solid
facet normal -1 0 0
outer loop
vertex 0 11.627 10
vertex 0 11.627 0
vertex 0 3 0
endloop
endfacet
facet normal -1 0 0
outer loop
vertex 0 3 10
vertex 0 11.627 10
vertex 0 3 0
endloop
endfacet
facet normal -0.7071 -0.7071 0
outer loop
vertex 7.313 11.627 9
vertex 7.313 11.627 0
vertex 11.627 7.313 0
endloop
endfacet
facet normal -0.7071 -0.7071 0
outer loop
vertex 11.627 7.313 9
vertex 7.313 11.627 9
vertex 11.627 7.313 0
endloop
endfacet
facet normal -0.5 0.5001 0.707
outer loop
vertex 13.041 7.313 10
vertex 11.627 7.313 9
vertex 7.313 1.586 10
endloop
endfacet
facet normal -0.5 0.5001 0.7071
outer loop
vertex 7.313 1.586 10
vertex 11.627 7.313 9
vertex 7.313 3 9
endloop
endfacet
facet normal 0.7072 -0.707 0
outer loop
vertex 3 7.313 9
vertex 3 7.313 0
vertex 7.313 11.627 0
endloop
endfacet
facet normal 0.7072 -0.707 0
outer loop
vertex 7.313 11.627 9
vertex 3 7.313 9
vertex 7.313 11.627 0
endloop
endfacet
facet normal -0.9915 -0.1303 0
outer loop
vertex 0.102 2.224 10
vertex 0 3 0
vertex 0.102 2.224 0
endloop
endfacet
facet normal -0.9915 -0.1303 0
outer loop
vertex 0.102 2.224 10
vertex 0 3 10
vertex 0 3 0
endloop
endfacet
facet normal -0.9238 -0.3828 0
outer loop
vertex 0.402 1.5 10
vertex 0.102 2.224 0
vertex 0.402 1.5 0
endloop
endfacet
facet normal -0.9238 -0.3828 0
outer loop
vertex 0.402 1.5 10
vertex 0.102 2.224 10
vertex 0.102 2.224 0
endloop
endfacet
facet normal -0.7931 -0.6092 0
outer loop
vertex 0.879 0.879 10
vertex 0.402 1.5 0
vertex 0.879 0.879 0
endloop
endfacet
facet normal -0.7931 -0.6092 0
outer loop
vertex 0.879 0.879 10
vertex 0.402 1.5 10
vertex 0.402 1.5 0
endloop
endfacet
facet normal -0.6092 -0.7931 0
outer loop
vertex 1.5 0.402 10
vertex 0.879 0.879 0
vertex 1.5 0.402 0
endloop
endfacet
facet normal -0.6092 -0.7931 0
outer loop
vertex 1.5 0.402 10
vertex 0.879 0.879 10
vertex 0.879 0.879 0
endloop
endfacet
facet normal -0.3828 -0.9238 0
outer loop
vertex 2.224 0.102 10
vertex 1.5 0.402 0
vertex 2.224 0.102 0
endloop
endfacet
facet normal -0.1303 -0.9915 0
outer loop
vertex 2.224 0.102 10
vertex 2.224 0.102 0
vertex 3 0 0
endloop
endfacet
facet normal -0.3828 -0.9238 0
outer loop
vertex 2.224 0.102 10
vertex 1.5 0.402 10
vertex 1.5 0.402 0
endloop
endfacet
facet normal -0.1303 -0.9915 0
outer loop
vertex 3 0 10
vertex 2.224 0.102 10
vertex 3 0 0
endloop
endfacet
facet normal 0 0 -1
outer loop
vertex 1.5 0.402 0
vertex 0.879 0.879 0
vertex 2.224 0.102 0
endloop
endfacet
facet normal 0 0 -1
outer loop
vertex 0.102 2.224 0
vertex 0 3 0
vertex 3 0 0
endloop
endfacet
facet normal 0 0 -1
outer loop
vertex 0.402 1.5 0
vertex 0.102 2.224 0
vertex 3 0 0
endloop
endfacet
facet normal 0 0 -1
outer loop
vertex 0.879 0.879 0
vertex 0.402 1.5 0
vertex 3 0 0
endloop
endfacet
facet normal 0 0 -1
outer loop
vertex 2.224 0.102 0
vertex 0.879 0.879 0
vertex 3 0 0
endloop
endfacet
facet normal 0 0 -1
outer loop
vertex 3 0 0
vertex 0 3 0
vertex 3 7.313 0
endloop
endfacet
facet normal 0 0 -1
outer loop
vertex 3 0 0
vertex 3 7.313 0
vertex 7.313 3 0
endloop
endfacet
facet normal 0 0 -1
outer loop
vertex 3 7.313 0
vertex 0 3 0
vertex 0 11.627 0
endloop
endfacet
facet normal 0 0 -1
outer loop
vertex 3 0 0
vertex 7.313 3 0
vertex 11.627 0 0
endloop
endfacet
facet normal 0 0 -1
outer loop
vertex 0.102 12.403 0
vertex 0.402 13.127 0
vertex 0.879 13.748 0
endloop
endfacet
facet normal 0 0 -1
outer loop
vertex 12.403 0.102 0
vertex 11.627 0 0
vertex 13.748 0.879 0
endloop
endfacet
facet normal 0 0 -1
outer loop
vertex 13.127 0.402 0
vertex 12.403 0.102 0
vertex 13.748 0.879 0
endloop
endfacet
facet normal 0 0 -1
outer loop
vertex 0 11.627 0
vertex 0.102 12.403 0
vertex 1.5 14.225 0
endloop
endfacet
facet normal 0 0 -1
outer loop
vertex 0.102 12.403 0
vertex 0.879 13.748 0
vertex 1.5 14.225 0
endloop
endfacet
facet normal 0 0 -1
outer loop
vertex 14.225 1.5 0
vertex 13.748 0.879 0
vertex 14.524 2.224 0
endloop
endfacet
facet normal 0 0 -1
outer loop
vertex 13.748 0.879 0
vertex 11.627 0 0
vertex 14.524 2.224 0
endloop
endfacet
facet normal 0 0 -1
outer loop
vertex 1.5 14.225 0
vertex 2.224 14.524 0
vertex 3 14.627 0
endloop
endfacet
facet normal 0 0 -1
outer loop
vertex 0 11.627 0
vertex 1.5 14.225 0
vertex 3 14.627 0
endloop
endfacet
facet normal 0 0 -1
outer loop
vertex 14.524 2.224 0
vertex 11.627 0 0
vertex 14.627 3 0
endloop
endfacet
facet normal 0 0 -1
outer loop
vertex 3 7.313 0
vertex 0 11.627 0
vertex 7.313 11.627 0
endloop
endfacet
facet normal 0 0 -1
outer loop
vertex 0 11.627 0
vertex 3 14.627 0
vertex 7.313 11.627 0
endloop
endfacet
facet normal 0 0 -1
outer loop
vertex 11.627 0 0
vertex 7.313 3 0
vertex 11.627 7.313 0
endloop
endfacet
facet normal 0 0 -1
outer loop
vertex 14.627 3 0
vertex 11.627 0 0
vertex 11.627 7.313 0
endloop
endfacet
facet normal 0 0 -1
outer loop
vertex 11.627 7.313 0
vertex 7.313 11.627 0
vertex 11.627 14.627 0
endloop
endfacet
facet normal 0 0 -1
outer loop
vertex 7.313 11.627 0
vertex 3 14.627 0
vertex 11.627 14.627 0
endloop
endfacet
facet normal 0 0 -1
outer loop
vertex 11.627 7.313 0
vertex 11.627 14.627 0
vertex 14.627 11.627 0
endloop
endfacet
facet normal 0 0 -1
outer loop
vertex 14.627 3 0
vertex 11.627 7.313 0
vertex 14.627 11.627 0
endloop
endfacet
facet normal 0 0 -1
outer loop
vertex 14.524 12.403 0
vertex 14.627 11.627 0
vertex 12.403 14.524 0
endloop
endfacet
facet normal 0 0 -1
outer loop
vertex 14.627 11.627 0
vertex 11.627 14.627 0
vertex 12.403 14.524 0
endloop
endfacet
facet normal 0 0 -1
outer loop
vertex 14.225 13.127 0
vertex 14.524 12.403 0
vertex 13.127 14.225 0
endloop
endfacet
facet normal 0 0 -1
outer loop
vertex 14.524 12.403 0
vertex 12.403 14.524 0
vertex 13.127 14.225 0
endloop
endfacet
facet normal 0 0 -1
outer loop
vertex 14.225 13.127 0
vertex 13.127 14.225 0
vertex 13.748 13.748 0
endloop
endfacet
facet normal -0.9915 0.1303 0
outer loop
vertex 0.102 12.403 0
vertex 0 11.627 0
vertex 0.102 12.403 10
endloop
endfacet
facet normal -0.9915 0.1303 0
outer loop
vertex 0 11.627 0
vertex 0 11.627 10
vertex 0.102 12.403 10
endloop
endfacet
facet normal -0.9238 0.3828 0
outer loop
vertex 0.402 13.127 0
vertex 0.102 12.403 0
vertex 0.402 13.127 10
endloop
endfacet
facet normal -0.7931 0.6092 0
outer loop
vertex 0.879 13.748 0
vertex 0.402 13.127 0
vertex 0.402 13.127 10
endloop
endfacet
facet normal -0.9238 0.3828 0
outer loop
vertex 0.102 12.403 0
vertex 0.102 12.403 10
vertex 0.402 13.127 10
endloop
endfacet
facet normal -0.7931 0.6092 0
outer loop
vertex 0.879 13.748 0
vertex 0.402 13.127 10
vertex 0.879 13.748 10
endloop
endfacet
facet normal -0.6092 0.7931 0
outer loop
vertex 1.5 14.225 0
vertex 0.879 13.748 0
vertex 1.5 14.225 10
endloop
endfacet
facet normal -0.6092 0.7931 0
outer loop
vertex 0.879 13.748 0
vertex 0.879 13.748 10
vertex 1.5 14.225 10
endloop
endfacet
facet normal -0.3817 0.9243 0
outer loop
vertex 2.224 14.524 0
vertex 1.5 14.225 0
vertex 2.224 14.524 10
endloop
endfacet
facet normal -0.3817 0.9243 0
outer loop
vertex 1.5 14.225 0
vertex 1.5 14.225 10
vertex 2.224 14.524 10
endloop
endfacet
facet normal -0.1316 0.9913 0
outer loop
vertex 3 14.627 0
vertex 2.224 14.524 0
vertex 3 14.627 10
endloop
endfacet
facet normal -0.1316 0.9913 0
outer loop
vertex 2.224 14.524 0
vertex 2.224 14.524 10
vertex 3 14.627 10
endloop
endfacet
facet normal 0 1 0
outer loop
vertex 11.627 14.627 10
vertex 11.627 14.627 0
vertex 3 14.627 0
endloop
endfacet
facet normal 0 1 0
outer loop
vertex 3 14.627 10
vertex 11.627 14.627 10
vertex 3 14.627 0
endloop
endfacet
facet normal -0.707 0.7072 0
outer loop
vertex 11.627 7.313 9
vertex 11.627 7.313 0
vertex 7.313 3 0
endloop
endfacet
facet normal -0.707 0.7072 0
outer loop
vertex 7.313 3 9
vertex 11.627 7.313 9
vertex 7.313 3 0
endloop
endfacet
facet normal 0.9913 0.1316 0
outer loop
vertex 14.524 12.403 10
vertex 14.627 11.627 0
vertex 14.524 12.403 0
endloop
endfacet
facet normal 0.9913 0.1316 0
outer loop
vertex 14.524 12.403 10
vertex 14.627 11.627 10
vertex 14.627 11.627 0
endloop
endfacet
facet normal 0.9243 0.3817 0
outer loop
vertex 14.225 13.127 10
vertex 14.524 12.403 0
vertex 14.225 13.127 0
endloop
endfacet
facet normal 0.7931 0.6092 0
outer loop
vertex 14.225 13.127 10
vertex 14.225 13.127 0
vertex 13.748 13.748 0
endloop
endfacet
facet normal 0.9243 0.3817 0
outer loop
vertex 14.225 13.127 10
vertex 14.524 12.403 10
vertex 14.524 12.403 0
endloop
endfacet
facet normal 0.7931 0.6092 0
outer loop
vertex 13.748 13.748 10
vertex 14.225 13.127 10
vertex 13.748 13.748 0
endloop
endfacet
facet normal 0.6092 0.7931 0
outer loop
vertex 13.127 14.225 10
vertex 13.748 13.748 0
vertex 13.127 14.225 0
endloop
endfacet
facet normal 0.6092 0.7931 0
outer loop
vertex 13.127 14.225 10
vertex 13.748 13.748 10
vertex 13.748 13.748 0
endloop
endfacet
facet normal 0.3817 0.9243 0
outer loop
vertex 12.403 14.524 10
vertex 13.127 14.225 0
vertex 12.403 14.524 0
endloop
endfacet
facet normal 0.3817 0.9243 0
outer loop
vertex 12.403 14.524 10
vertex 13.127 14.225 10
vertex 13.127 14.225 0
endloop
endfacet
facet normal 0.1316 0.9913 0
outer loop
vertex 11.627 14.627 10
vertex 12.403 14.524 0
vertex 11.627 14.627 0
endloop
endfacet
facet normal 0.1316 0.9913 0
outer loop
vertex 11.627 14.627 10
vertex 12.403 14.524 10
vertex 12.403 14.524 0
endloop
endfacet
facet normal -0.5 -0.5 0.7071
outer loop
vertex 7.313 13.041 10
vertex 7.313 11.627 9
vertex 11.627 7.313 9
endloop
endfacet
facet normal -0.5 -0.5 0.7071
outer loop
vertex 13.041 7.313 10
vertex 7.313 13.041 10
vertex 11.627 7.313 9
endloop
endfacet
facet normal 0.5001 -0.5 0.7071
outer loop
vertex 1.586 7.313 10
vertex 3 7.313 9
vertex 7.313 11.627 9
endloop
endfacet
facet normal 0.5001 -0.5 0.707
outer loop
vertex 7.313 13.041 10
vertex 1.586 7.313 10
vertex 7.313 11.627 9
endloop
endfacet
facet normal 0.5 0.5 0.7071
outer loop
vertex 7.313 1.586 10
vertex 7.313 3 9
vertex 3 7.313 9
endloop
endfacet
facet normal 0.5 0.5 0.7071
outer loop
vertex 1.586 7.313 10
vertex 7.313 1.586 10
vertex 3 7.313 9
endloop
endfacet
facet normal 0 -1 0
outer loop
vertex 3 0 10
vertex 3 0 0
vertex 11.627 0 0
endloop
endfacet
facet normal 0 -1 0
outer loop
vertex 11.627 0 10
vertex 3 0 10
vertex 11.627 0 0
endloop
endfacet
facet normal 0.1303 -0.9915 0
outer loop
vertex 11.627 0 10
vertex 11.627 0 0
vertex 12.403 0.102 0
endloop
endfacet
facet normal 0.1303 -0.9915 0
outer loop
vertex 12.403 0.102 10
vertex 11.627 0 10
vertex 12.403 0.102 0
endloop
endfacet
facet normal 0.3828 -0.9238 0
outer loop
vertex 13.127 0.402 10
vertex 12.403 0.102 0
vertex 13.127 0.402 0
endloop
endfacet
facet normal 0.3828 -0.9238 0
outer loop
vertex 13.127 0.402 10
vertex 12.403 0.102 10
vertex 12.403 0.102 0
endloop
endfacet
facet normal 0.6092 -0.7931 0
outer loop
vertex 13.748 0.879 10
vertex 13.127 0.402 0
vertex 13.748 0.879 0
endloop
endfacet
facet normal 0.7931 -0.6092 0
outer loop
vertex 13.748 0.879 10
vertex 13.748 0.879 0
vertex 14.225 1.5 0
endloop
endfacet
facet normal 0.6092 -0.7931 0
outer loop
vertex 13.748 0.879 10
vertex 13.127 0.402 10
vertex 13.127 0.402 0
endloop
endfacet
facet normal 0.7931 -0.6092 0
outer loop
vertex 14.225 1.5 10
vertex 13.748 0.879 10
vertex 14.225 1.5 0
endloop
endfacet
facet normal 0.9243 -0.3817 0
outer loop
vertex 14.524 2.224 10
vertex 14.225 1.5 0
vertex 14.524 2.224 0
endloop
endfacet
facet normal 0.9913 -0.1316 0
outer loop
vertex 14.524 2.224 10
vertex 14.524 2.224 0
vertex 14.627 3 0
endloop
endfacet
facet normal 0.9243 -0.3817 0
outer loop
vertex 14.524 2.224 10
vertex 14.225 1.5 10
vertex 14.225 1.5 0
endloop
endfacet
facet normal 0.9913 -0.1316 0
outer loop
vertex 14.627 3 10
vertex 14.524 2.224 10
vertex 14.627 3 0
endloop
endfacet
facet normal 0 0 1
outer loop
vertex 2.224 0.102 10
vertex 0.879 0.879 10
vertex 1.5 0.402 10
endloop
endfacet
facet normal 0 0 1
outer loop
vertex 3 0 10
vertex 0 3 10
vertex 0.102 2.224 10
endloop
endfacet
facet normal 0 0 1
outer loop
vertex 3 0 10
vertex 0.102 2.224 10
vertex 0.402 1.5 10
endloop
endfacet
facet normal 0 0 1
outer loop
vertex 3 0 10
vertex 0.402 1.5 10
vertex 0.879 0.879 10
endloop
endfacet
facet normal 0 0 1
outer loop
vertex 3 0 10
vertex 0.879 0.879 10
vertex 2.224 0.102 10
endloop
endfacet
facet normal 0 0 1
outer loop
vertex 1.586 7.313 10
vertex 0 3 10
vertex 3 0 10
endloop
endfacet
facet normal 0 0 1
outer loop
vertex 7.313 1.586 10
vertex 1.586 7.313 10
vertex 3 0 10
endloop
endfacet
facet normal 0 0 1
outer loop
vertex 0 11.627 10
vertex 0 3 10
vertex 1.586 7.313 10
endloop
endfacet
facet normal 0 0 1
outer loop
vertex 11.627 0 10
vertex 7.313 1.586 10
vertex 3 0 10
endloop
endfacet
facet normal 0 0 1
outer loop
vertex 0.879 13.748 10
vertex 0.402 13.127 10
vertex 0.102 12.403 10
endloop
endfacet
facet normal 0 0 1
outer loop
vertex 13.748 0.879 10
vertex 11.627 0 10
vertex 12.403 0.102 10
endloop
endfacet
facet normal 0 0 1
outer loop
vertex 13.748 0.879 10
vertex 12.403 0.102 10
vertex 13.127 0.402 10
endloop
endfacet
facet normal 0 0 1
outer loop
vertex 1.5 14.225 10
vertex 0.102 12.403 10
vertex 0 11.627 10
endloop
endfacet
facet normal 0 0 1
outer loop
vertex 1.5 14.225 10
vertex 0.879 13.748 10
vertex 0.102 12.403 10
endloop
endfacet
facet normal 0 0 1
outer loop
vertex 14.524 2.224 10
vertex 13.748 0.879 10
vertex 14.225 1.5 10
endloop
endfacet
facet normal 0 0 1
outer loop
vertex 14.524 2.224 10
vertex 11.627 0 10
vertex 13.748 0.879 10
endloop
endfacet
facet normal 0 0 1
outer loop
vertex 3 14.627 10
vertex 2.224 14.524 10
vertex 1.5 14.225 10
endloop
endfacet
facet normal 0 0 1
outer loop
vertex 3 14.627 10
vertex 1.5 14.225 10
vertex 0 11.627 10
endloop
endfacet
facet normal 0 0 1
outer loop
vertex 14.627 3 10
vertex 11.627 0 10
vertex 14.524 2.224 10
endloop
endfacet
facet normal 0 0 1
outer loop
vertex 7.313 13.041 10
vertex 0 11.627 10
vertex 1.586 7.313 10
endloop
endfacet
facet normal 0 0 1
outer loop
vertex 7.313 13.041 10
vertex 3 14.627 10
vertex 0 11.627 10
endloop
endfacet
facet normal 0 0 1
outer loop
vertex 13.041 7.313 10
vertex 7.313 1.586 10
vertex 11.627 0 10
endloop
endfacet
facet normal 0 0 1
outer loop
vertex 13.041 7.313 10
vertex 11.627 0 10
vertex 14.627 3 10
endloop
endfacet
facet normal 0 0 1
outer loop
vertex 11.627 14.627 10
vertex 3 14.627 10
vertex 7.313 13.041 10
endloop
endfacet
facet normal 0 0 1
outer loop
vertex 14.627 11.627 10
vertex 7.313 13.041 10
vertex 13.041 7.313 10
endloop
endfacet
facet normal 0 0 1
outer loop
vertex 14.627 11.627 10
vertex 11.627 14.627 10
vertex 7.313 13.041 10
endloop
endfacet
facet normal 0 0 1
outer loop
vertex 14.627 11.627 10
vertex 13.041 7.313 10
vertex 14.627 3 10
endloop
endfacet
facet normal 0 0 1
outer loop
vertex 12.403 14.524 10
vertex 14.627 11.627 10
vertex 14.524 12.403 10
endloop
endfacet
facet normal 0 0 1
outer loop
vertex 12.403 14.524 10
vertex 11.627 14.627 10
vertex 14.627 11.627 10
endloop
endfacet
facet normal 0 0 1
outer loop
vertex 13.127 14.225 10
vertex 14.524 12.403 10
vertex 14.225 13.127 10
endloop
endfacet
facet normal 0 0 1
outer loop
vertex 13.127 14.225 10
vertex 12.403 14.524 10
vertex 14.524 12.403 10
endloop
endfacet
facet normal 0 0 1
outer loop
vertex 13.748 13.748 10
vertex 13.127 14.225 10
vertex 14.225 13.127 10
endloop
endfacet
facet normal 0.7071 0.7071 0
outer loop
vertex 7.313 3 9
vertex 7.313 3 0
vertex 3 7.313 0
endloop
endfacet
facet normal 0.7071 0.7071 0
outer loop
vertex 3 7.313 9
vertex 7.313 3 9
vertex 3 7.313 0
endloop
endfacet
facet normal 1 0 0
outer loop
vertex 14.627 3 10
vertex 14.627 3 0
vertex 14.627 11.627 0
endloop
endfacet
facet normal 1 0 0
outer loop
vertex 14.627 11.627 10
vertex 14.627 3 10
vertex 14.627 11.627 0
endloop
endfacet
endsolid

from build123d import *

# Parameters (mm, degrees)
F1_DEPTH = 10
F2_R     = 3
F3_SIZE  = 1


with BuildPart() as f1:
    # F0 (on Top) → F1 (new body)
    with BuildSketch(Plane.XY):
        Polygon((0, 14.626703), (0, 7.313351), (3, 7.313351), (7.313351, 11.626703), (7.313351, 14.626703), align=None)
        Polygon((0, 7.313351), (0, 0), (7.313351, 0), (7.313351, 3), (3, 7.313351), align=None)
        Polygon((7.313351, 3), (7.313351, 0), (14.626703, 0), (14.626703, 7.313351), (11.626703, 7.313351), align=None)
        Polygon((11.626703, 7.313351), (14.626703, 7.313351), (14.626703, 14.626703), (7.313351, 14.626703), (7.313351, 11.626703), align=None)
    extrude(amount=F1_DEPTH)

    # F2
    f2_edges = [f1.edges().sort_by_distance(p)[0] for p in [
        (0, 0, 5),
        (0, 14.626703, 5),
        (14.626703, 0, 5),
        (14.626703, 14.626703, 5),
    ]]
    fillet(f2_edges, radius=F2_R)

    # F3
    f3_edges = [f1.edges().sort_by_distance(p)[0] for p in [
        (5.156676, 9.470027, 10),
        (5.156676, 5.156676, 10),
        (9.470027, 9.470027, 10),
        (9.470027, 5.156676, 10),
    ]]
    chamfer(f3_edges, length=F3_SIZE)


solid = f1.part
